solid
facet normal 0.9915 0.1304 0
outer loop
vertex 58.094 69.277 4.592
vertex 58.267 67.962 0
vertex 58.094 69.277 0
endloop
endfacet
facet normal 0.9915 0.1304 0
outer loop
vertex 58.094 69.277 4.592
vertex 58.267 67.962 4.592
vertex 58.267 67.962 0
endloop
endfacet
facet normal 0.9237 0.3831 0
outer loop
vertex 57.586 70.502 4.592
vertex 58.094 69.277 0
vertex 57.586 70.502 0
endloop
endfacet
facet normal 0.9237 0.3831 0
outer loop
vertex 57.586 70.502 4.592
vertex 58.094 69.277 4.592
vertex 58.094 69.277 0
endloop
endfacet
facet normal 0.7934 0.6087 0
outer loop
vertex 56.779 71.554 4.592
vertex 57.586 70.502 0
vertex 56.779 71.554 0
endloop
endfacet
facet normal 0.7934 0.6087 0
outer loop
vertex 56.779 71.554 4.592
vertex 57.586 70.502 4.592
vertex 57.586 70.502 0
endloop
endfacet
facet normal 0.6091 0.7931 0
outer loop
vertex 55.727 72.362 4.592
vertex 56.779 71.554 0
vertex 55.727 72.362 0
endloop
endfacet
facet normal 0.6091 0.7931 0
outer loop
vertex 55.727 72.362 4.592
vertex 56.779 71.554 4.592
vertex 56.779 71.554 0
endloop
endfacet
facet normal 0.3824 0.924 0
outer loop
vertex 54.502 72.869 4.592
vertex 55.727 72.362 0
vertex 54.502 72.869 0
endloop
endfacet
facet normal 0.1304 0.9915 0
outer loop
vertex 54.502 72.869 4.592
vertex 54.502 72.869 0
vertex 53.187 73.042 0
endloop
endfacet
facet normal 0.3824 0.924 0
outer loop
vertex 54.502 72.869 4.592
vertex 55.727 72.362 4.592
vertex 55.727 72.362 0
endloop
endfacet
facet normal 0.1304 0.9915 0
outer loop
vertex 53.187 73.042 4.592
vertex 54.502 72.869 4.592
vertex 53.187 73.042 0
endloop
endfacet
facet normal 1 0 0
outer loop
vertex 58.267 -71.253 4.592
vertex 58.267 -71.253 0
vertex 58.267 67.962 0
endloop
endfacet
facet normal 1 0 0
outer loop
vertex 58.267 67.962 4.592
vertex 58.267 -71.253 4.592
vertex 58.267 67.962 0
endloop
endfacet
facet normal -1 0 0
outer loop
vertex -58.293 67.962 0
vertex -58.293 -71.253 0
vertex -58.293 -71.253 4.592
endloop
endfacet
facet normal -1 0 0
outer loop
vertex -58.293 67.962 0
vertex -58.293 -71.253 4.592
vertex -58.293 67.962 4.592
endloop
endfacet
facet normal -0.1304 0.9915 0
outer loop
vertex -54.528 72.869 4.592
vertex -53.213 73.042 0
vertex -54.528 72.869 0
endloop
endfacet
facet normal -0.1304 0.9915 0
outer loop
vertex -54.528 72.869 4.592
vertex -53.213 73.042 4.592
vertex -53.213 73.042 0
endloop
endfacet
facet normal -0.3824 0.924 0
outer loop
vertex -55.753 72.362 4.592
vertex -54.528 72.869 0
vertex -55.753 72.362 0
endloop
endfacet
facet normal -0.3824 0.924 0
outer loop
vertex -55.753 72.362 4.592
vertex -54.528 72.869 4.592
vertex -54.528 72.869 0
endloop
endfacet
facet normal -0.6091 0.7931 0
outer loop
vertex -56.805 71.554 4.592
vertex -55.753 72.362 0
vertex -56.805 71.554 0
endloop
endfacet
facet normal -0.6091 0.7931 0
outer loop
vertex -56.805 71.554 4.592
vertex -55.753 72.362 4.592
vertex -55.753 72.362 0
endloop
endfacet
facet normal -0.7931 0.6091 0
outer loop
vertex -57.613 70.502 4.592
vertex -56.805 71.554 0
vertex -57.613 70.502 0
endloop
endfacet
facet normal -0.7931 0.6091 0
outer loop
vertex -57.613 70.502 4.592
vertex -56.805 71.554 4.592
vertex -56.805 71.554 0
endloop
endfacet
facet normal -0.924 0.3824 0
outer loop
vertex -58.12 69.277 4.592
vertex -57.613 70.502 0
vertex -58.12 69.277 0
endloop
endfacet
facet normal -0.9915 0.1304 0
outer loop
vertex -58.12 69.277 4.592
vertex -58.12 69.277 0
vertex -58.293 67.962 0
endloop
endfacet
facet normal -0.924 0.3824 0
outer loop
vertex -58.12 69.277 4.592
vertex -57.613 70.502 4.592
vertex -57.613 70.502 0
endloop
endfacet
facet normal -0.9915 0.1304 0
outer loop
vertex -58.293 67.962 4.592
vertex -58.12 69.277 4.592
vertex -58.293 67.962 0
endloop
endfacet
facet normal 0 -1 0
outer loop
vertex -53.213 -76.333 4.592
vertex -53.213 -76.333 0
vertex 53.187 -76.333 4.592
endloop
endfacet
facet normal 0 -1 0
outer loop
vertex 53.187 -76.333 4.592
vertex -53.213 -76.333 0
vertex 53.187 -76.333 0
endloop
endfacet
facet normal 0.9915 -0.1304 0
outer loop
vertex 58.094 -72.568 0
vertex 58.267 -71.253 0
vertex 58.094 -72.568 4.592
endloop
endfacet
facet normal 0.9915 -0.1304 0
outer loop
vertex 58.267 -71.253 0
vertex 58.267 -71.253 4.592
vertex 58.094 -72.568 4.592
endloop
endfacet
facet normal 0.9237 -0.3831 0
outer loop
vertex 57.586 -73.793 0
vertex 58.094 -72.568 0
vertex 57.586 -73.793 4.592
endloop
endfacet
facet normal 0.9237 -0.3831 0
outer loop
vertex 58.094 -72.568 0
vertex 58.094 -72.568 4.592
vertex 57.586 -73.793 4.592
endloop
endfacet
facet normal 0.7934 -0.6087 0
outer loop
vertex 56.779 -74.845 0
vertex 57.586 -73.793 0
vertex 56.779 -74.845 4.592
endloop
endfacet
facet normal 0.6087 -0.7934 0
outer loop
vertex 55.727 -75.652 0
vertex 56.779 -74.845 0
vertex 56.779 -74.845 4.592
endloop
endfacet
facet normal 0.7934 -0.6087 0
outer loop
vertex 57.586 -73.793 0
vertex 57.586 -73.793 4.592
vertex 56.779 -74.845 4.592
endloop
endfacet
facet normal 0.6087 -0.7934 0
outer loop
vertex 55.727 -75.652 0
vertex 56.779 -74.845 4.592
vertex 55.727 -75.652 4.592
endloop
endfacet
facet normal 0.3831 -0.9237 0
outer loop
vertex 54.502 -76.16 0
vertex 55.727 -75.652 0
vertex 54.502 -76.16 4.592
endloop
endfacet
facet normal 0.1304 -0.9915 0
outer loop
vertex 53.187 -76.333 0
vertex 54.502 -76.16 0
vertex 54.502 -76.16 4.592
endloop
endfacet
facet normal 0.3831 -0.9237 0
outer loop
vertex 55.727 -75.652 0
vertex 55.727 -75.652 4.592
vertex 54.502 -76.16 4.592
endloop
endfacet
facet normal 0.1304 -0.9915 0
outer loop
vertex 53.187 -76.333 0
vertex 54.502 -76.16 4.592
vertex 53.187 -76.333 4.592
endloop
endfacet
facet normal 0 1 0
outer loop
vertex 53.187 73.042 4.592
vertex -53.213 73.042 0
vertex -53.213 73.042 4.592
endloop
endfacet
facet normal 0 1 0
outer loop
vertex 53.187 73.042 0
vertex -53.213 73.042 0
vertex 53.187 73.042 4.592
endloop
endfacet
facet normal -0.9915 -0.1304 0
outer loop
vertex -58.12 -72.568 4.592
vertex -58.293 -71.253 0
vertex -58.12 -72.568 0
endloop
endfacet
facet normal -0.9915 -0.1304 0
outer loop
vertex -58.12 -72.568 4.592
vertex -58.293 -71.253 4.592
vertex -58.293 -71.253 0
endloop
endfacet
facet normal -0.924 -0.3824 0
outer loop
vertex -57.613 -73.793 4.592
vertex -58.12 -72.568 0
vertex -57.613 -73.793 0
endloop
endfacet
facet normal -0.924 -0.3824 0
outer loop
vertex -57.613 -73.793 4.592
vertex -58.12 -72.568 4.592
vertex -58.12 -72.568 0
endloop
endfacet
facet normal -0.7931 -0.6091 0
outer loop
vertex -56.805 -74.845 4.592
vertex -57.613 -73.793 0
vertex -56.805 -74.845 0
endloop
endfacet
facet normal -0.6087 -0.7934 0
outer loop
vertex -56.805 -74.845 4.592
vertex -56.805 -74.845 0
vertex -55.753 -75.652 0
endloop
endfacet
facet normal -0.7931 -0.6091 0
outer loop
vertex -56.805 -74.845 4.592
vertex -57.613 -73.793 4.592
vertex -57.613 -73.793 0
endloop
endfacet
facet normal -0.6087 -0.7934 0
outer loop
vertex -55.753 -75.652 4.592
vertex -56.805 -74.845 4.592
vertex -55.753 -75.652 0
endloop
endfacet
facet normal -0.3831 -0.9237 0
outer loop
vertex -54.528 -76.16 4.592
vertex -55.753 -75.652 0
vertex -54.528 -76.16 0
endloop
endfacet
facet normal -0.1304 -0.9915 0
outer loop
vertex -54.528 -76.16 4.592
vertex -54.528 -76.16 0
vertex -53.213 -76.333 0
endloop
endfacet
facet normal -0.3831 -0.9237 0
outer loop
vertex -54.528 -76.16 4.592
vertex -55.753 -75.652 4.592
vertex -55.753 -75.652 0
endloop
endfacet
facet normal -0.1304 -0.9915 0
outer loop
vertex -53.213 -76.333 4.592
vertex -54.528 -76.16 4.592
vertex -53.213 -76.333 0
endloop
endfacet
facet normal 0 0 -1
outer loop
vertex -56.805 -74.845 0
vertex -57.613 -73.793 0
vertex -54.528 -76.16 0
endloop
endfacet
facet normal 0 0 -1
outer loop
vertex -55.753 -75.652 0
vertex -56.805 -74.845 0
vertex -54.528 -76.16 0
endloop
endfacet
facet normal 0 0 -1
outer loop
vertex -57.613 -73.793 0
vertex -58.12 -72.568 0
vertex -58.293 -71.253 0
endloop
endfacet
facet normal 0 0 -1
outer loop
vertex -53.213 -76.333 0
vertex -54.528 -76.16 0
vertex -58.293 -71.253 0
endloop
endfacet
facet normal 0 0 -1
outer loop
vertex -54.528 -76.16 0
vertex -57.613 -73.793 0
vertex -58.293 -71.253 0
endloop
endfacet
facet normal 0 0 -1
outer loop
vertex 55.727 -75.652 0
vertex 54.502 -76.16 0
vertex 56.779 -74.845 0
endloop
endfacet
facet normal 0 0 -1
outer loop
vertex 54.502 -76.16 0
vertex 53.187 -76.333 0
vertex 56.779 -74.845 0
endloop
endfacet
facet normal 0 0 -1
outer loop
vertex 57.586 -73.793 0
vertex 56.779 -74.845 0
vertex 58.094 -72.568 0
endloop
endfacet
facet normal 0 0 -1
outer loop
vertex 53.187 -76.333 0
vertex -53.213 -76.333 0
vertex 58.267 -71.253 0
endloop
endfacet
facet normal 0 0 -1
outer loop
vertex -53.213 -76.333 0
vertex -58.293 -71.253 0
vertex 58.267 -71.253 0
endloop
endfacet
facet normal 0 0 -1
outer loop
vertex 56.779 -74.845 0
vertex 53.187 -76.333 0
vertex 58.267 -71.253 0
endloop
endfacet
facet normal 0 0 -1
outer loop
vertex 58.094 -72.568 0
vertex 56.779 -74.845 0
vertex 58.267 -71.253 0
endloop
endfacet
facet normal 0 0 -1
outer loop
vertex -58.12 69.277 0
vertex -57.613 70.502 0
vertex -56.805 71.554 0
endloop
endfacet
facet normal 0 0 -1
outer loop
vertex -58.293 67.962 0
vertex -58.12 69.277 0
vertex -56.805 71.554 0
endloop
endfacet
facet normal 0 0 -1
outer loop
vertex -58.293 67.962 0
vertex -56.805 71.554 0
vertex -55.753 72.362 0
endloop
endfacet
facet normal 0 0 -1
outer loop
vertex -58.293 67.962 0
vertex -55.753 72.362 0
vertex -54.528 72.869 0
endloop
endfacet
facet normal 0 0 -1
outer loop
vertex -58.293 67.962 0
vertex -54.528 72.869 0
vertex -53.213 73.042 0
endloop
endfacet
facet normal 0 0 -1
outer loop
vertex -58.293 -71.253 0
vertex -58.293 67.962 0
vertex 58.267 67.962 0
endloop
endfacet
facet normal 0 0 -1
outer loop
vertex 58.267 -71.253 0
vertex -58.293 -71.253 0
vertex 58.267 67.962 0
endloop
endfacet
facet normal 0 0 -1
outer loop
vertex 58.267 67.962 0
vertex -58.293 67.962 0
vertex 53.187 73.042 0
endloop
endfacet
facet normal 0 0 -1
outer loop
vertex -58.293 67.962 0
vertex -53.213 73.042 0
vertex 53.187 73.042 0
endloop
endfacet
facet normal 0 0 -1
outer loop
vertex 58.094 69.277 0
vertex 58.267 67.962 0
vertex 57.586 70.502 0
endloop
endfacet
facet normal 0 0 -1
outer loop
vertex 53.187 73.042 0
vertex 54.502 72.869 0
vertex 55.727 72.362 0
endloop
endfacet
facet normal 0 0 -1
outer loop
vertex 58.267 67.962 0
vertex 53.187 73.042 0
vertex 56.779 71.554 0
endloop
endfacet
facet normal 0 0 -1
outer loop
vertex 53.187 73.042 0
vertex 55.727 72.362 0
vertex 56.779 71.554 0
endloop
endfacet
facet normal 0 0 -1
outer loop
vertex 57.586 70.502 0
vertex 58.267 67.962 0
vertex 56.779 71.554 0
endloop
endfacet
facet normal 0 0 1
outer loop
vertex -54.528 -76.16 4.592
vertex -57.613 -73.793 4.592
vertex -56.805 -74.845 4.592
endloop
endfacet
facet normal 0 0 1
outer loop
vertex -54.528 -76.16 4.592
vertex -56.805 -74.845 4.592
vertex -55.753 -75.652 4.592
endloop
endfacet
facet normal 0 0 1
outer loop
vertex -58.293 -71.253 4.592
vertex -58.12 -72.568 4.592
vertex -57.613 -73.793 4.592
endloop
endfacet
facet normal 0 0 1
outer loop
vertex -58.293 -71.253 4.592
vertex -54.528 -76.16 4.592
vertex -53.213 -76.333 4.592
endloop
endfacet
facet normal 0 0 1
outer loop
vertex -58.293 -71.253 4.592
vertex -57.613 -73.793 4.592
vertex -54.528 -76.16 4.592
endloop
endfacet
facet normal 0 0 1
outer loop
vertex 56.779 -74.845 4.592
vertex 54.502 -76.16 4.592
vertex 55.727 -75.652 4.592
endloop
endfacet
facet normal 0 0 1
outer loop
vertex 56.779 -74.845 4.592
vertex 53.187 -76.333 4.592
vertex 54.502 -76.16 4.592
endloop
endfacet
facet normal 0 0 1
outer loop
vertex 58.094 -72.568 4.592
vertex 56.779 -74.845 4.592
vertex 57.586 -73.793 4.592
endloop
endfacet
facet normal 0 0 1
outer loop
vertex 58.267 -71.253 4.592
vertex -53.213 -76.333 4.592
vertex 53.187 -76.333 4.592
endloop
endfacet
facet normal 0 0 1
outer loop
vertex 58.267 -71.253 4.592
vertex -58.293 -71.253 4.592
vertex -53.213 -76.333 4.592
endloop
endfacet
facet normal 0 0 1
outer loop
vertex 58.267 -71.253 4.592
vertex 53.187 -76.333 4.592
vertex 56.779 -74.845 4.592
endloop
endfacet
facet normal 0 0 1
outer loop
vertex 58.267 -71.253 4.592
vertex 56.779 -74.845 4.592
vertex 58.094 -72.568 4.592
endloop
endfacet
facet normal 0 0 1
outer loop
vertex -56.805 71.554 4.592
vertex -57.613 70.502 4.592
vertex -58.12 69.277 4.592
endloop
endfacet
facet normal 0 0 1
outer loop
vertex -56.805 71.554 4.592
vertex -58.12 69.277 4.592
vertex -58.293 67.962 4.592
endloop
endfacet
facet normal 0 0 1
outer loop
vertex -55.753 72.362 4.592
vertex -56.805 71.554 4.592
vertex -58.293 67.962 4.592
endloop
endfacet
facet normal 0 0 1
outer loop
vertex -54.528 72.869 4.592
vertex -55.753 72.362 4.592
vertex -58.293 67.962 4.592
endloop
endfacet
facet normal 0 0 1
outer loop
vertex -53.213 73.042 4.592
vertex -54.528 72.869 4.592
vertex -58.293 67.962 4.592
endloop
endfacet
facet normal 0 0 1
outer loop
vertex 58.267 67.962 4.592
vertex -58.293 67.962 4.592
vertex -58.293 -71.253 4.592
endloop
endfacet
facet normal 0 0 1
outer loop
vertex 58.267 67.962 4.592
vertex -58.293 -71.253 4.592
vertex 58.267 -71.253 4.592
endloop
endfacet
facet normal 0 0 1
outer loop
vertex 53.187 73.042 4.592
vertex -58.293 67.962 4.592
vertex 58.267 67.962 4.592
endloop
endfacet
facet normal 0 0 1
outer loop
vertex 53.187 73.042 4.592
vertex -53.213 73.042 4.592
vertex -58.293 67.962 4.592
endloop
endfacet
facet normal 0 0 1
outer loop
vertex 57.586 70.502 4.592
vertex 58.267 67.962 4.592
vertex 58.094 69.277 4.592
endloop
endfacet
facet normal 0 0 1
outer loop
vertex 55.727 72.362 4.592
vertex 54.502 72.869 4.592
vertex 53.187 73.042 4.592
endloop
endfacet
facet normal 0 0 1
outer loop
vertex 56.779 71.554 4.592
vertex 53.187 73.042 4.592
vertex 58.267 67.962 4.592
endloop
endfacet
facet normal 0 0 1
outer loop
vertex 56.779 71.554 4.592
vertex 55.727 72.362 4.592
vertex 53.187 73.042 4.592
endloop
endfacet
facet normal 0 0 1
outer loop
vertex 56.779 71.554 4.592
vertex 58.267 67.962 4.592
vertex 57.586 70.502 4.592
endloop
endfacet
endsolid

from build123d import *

# Parameters (mm, degrees)
F0_W     = 116.560347
F0_H     = 149.375044
F1_DEPTH = 4.591908
F2_R     = 5.08
F3_R     = 5.08
F4_R     = 5.08


with BuildPart() as f1:
    # F0 (on Top) → F1 (new body)
    with BuildSketch(Plane.XY):
        with Locations((-0.013132, -1.645226)):
            Rectangle(F0_W, F0_H)
    extrude(amount=F1_DEPTH)

    # F2
    f2_edges = [f1.edges().sort_by_distance(p)[0] for p in [
        (58.267042, 73.042296, 2.295954),
    ]]
    fillet(f2_edges, radius=F2_R)

    # F3
    f3_edges = [f1.edges().sort_by_distance(p)[0] for p in [
        (-58.293305, 73.042296, 2.295954),
    ]]
    fillet(f3_edges, radius=F3_R)

    # F4
    f4_edges = [f1.edges().sort_by_distance(p)[0] for p in [
        (58.267042, -76.332748, 2.295954),
        (-58.293305, -76.332748, 2.295954),
    ]]
    fillet(f4_edges, radius=F4_R)


solid = f1.part
